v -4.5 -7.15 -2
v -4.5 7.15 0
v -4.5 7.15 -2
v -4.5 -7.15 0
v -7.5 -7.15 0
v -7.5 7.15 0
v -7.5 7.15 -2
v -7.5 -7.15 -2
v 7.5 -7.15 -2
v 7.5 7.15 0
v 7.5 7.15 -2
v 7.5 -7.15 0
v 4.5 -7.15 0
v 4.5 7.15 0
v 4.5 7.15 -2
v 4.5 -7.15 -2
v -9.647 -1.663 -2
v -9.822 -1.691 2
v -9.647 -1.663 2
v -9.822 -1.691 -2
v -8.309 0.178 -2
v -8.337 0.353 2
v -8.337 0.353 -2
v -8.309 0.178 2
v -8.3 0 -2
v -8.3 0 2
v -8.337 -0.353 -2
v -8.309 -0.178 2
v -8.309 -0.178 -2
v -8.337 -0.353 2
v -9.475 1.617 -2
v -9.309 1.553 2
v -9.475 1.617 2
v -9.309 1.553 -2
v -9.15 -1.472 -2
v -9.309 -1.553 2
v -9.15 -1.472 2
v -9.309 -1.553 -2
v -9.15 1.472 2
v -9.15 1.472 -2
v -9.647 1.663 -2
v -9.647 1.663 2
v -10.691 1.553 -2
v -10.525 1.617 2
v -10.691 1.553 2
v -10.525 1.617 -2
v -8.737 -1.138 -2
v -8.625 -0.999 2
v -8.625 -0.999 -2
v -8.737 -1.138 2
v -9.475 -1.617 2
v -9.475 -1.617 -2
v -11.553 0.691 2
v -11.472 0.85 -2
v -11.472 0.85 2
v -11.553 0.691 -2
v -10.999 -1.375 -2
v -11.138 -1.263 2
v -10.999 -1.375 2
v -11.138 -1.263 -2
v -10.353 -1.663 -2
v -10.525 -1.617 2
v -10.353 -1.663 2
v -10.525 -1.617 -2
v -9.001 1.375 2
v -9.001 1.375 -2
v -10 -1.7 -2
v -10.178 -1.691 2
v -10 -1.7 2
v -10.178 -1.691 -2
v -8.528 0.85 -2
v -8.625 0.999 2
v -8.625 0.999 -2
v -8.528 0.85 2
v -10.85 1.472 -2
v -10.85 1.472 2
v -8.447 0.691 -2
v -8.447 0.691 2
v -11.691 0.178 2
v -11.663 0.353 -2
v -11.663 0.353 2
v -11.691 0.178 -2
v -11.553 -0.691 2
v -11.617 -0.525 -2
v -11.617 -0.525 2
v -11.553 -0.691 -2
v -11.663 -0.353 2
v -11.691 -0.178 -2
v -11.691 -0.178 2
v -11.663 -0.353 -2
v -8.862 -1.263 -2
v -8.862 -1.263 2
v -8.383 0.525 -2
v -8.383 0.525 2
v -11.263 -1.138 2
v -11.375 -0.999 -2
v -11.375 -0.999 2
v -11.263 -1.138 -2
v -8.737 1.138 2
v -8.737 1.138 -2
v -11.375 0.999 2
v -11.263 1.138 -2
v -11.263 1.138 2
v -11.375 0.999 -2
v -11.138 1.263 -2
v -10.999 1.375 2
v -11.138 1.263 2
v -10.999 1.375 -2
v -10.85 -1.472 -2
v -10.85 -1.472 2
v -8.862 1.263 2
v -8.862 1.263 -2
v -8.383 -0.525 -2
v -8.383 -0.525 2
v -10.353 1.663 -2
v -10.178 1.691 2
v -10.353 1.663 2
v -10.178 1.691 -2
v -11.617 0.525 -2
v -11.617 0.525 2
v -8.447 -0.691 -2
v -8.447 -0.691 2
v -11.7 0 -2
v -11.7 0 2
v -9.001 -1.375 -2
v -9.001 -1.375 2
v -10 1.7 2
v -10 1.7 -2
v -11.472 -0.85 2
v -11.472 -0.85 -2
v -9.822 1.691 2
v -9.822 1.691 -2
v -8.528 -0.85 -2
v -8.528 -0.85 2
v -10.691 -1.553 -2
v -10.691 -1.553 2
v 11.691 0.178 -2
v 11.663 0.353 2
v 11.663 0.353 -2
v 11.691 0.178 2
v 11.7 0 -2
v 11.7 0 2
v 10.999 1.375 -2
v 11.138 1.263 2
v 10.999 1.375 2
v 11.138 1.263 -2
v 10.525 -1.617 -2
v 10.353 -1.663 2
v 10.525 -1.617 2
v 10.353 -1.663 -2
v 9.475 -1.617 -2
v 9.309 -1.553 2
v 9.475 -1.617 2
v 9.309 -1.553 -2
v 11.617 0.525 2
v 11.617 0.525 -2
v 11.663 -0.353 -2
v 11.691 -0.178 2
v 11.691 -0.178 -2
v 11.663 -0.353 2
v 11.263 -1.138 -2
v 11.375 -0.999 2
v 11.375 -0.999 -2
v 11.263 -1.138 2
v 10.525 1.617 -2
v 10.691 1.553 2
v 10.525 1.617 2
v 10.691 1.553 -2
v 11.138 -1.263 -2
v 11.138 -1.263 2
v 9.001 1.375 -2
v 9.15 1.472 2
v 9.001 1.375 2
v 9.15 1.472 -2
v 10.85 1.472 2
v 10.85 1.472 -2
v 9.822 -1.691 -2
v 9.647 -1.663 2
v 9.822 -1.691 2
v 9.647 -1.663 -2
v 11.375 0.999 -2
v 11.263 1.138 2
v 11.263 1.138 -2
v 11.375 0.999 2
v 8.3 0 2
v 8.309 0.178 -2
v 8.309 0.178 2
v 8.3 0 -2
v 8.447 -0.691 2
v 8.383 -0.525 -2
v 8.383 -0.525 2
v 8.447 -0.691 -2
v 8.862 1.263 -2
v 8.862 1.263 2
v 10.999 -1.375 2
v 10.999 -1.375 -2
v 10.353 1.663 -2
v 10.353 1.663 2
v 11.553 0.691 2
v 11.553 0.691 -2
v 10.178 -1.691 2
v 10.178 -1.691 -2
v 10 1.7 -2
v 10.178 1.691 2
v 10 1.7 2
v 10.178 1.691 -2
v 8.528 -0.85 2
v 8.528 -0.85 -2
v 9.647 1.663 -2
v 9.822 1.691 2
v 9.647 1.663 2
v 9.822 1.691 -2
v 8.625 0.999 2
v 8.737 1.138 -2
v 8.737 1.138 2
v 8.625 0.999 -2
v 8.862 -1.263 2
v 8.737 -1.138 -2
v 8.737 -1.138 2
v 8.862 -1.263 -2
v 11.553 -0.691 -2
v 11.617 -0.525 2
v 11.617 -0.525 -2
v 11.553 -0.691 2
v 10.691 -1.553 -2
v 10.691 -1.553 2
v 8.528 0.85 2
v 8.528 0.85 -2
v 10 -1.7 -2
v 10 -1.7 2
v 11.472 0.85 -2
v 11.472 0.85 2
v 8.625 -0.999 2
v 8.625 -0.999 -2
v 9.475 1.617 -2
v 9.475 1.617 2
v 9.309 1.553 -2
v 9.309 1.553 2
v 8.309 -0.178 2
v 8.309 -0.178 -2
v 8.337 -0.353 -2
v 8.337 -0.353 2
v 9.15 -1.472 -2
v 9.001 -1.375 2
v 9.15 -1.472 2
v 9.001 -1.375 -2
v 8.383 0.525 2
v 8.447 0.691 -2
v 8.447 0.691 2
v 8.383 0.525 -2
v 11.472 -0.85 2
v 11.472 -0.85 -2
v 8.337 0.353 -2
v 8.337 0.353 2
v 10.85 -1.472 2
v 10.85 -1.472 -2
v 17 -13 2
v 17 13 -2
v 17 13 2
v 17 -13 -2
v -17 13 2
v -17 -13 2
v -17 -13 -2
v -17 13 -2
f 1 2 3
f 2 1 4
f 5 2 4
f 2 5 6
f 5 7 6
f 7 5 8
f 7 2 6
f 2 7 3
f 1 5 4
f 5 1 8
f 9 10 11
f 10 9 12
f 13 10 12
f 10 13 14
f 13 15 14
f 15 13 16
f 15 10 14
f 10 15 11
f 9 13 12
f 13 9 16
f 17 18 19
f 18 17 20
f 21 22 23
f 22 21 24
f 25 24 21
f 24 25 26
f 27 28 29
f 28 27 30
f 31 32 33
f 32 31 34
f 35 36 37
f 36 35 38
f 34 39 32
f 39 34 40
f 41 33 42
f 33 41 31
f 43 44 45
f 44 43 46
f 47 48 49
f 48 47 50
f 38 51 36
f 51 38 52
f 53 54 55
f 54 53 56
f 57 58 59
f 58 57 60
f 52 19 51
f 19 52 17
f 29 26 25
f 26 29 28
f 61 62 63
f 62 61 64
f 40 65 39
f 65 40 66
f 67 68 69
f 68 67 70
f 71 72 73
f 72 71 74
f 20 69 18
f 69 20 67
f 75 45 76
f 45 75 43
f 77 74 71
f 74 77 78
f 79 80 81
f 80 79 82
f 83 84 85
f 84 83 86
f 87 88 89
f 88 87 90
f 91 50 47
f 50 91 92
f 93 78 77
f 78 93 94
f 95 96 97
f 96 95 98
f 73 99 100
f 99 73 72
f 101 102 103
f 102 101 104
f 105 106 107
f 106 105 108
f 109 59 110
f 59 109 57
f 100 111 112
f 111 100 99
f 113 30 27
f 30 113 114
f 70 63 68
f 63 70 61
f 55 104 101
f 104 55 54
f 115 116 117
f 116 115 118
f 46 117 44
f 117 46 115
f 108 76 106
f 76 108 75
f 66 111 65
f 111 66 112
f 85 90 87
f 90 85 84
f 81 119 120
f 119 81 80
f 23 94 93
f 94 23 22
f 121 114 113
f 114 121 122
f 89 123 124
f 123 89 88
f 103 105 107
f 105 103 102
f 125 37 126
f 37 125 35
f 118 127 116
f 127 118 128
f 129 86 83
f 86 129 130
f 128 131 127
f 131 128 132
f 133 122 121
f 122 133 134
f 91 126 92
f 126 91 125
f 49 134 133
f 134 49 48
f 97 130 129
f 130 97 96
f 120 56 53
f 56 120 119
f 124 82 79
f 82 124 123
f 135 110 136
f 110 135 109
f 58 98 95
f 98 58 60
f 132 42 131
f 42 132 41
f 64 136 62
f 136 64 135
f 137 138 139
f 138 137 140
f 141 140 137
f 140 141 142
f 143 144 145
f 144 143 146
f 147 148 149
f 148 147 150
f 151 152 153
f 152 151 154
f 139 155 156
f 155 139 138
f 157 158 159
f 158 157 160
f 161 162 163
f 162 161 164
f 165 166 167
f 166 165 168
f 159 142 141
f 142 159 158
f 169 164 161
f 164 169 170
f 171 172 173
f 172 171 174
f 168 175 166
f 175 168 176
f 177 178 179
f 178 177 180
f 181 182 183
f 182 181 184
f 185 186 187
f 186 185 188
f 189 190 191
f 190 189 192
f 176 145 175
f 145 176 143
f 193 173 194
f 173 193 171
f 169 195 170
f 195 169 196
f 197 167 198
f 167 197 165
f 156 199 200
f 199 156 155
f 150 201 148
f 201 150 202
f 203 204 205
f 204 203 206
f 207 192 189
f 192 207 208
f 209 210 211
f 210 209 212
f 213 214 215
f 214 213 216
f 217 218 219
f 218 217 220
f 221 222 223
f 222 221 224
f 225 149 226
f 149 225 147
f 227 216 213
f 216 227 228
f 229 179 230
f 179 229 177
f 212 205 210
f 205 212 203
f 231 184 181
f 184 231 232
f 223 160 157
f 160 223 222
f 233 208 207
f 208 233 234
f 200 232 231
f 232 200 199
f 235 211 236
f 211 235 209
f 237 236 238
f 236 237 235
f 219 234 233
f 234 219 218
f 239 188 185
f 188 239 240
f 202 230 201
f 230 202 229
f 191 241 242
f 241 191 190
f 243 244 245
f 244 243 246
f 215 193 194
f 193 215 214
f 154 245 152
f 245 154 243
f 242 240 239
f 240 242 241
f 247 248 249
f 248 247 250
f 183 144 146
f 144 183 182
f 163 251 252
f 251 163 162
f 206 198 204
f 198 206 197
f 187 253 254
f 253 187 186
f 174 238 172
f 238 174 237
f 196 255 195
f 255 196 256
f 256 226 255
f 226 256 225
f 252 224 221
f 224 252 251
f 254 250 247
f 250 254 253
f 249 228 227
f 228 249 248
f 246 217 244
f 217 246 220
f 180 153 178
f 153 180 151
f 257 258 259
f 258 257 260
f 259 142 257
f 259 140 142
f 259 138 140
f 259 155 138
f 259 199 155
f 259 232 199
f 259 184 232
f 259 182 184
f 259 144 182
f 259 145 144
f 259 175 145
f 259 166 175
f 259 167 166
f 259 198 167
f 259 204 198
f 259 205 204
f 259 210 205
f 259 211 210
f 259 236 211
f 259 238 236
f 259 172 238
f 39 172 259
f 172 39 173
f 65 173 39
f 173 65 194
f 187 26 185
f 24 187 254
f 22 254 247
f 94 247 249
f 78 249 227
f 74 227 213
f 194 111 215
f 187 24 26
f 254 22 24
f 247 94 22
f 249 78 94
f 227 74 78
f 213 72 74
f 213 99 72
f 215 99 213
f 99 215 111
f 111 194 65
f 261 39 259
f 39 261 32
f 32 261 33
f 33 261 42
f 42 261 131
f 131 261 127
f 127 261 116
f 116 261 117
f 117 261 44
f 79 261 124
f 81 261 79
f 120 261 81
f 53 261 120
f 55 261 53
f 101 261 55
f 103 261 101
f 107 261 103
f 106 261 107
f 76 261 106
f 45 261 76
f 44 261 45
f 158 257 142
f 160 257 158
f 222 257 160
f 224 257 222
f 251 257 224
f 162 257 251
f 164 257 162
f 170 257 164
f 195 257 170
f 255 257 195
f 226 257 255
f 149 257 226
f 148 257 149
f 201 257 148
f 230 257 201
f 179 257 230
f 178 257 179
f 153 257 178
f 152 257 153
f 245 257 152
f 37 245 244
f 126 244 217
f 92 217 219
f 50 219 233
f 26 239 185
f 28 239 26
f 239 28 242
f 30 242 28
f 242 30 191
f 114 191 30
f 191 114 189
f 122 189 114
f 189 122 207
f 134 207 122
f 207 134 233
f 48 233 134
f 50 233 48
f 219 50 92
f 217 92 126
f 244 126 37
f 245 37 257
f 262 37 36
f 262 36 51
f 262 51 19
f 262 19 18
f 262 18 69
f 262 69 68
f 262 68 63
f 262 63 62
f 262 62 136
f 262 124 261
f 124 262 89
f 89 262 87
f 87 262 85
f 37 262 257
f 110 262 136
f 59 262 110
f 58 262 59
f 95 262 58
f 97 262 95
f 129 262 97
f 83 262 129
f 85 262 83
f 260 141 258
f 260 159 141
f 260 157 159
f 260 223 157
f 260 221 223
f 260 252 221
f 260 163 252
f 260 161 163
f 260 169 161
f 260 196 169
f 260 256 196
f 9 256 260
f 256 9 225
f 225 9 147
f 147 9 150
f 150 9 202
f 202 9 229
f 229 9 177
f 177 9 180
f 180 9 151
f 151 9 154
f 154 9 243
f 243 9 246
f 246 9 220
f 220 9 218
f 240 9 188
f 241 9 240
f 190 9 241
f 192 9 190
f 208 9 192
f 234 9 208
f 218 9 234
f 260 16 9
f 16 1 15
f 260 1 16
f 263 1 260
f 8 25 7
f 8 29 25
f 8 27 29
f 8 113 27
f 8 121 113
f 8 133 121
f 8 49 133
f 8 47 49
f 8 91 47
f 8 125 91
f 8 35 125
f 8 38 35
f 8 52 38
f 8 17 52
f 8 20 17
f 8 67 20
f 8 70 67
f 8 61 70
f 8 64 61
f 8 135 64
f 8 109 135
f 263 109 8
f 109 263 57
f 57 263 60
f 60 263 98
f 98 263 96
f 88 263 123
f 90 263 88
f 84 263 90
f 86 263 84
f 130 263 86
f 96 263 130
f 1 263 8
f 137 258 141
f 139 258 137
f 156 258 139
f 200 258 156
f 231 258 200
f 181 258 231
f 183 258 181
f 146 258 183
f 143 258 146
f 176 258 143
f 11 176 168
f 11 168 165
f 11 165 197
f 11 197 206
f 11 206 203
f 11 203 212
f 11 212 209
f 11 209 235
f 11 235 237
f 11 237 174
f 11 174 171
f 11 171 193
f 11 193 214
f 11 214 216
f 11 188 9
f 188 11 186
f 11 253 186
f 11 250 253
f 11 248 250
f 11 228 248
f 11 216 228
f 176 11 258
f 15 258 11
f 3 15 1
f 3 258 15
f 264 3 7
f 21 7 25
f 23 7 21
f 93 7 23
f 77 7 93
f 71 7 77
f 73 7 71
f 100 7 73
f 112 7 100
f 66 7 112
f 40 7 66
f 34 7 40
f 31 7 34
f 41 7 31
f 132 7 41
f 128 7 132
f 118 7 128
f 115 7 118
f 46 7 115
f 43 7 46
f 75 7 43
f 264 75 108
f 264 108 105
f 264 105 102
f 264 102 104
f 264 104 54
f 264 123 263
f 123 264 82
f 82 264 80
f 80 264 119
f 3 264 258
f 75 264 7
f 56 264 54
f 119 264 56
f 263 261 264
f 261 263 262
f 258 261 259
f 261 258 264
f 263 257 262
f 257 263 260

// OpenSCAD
// Cable-tie base with two strap slots.
$fn = 60;
eps = 0.02;
base_w = 26;
base_l = 34;
base_t = 4;
slot_w = 3;
slot_l = 12;
difference() {
    cube([base_l,base_w,base_t],center=true);
    for (x=[-slot_l/2,slot_l/2]) translate([x,0,-base_t/2-eps]) cube([slot_w,base_w*0.55,base_t+2*eps],center=true);
    for (x=[-base_l/2+7,base_l/2-7]) translate([x,0,-base_t/2-eps]) cylinder(d=3.4,h=base_t+2*eps);
}
